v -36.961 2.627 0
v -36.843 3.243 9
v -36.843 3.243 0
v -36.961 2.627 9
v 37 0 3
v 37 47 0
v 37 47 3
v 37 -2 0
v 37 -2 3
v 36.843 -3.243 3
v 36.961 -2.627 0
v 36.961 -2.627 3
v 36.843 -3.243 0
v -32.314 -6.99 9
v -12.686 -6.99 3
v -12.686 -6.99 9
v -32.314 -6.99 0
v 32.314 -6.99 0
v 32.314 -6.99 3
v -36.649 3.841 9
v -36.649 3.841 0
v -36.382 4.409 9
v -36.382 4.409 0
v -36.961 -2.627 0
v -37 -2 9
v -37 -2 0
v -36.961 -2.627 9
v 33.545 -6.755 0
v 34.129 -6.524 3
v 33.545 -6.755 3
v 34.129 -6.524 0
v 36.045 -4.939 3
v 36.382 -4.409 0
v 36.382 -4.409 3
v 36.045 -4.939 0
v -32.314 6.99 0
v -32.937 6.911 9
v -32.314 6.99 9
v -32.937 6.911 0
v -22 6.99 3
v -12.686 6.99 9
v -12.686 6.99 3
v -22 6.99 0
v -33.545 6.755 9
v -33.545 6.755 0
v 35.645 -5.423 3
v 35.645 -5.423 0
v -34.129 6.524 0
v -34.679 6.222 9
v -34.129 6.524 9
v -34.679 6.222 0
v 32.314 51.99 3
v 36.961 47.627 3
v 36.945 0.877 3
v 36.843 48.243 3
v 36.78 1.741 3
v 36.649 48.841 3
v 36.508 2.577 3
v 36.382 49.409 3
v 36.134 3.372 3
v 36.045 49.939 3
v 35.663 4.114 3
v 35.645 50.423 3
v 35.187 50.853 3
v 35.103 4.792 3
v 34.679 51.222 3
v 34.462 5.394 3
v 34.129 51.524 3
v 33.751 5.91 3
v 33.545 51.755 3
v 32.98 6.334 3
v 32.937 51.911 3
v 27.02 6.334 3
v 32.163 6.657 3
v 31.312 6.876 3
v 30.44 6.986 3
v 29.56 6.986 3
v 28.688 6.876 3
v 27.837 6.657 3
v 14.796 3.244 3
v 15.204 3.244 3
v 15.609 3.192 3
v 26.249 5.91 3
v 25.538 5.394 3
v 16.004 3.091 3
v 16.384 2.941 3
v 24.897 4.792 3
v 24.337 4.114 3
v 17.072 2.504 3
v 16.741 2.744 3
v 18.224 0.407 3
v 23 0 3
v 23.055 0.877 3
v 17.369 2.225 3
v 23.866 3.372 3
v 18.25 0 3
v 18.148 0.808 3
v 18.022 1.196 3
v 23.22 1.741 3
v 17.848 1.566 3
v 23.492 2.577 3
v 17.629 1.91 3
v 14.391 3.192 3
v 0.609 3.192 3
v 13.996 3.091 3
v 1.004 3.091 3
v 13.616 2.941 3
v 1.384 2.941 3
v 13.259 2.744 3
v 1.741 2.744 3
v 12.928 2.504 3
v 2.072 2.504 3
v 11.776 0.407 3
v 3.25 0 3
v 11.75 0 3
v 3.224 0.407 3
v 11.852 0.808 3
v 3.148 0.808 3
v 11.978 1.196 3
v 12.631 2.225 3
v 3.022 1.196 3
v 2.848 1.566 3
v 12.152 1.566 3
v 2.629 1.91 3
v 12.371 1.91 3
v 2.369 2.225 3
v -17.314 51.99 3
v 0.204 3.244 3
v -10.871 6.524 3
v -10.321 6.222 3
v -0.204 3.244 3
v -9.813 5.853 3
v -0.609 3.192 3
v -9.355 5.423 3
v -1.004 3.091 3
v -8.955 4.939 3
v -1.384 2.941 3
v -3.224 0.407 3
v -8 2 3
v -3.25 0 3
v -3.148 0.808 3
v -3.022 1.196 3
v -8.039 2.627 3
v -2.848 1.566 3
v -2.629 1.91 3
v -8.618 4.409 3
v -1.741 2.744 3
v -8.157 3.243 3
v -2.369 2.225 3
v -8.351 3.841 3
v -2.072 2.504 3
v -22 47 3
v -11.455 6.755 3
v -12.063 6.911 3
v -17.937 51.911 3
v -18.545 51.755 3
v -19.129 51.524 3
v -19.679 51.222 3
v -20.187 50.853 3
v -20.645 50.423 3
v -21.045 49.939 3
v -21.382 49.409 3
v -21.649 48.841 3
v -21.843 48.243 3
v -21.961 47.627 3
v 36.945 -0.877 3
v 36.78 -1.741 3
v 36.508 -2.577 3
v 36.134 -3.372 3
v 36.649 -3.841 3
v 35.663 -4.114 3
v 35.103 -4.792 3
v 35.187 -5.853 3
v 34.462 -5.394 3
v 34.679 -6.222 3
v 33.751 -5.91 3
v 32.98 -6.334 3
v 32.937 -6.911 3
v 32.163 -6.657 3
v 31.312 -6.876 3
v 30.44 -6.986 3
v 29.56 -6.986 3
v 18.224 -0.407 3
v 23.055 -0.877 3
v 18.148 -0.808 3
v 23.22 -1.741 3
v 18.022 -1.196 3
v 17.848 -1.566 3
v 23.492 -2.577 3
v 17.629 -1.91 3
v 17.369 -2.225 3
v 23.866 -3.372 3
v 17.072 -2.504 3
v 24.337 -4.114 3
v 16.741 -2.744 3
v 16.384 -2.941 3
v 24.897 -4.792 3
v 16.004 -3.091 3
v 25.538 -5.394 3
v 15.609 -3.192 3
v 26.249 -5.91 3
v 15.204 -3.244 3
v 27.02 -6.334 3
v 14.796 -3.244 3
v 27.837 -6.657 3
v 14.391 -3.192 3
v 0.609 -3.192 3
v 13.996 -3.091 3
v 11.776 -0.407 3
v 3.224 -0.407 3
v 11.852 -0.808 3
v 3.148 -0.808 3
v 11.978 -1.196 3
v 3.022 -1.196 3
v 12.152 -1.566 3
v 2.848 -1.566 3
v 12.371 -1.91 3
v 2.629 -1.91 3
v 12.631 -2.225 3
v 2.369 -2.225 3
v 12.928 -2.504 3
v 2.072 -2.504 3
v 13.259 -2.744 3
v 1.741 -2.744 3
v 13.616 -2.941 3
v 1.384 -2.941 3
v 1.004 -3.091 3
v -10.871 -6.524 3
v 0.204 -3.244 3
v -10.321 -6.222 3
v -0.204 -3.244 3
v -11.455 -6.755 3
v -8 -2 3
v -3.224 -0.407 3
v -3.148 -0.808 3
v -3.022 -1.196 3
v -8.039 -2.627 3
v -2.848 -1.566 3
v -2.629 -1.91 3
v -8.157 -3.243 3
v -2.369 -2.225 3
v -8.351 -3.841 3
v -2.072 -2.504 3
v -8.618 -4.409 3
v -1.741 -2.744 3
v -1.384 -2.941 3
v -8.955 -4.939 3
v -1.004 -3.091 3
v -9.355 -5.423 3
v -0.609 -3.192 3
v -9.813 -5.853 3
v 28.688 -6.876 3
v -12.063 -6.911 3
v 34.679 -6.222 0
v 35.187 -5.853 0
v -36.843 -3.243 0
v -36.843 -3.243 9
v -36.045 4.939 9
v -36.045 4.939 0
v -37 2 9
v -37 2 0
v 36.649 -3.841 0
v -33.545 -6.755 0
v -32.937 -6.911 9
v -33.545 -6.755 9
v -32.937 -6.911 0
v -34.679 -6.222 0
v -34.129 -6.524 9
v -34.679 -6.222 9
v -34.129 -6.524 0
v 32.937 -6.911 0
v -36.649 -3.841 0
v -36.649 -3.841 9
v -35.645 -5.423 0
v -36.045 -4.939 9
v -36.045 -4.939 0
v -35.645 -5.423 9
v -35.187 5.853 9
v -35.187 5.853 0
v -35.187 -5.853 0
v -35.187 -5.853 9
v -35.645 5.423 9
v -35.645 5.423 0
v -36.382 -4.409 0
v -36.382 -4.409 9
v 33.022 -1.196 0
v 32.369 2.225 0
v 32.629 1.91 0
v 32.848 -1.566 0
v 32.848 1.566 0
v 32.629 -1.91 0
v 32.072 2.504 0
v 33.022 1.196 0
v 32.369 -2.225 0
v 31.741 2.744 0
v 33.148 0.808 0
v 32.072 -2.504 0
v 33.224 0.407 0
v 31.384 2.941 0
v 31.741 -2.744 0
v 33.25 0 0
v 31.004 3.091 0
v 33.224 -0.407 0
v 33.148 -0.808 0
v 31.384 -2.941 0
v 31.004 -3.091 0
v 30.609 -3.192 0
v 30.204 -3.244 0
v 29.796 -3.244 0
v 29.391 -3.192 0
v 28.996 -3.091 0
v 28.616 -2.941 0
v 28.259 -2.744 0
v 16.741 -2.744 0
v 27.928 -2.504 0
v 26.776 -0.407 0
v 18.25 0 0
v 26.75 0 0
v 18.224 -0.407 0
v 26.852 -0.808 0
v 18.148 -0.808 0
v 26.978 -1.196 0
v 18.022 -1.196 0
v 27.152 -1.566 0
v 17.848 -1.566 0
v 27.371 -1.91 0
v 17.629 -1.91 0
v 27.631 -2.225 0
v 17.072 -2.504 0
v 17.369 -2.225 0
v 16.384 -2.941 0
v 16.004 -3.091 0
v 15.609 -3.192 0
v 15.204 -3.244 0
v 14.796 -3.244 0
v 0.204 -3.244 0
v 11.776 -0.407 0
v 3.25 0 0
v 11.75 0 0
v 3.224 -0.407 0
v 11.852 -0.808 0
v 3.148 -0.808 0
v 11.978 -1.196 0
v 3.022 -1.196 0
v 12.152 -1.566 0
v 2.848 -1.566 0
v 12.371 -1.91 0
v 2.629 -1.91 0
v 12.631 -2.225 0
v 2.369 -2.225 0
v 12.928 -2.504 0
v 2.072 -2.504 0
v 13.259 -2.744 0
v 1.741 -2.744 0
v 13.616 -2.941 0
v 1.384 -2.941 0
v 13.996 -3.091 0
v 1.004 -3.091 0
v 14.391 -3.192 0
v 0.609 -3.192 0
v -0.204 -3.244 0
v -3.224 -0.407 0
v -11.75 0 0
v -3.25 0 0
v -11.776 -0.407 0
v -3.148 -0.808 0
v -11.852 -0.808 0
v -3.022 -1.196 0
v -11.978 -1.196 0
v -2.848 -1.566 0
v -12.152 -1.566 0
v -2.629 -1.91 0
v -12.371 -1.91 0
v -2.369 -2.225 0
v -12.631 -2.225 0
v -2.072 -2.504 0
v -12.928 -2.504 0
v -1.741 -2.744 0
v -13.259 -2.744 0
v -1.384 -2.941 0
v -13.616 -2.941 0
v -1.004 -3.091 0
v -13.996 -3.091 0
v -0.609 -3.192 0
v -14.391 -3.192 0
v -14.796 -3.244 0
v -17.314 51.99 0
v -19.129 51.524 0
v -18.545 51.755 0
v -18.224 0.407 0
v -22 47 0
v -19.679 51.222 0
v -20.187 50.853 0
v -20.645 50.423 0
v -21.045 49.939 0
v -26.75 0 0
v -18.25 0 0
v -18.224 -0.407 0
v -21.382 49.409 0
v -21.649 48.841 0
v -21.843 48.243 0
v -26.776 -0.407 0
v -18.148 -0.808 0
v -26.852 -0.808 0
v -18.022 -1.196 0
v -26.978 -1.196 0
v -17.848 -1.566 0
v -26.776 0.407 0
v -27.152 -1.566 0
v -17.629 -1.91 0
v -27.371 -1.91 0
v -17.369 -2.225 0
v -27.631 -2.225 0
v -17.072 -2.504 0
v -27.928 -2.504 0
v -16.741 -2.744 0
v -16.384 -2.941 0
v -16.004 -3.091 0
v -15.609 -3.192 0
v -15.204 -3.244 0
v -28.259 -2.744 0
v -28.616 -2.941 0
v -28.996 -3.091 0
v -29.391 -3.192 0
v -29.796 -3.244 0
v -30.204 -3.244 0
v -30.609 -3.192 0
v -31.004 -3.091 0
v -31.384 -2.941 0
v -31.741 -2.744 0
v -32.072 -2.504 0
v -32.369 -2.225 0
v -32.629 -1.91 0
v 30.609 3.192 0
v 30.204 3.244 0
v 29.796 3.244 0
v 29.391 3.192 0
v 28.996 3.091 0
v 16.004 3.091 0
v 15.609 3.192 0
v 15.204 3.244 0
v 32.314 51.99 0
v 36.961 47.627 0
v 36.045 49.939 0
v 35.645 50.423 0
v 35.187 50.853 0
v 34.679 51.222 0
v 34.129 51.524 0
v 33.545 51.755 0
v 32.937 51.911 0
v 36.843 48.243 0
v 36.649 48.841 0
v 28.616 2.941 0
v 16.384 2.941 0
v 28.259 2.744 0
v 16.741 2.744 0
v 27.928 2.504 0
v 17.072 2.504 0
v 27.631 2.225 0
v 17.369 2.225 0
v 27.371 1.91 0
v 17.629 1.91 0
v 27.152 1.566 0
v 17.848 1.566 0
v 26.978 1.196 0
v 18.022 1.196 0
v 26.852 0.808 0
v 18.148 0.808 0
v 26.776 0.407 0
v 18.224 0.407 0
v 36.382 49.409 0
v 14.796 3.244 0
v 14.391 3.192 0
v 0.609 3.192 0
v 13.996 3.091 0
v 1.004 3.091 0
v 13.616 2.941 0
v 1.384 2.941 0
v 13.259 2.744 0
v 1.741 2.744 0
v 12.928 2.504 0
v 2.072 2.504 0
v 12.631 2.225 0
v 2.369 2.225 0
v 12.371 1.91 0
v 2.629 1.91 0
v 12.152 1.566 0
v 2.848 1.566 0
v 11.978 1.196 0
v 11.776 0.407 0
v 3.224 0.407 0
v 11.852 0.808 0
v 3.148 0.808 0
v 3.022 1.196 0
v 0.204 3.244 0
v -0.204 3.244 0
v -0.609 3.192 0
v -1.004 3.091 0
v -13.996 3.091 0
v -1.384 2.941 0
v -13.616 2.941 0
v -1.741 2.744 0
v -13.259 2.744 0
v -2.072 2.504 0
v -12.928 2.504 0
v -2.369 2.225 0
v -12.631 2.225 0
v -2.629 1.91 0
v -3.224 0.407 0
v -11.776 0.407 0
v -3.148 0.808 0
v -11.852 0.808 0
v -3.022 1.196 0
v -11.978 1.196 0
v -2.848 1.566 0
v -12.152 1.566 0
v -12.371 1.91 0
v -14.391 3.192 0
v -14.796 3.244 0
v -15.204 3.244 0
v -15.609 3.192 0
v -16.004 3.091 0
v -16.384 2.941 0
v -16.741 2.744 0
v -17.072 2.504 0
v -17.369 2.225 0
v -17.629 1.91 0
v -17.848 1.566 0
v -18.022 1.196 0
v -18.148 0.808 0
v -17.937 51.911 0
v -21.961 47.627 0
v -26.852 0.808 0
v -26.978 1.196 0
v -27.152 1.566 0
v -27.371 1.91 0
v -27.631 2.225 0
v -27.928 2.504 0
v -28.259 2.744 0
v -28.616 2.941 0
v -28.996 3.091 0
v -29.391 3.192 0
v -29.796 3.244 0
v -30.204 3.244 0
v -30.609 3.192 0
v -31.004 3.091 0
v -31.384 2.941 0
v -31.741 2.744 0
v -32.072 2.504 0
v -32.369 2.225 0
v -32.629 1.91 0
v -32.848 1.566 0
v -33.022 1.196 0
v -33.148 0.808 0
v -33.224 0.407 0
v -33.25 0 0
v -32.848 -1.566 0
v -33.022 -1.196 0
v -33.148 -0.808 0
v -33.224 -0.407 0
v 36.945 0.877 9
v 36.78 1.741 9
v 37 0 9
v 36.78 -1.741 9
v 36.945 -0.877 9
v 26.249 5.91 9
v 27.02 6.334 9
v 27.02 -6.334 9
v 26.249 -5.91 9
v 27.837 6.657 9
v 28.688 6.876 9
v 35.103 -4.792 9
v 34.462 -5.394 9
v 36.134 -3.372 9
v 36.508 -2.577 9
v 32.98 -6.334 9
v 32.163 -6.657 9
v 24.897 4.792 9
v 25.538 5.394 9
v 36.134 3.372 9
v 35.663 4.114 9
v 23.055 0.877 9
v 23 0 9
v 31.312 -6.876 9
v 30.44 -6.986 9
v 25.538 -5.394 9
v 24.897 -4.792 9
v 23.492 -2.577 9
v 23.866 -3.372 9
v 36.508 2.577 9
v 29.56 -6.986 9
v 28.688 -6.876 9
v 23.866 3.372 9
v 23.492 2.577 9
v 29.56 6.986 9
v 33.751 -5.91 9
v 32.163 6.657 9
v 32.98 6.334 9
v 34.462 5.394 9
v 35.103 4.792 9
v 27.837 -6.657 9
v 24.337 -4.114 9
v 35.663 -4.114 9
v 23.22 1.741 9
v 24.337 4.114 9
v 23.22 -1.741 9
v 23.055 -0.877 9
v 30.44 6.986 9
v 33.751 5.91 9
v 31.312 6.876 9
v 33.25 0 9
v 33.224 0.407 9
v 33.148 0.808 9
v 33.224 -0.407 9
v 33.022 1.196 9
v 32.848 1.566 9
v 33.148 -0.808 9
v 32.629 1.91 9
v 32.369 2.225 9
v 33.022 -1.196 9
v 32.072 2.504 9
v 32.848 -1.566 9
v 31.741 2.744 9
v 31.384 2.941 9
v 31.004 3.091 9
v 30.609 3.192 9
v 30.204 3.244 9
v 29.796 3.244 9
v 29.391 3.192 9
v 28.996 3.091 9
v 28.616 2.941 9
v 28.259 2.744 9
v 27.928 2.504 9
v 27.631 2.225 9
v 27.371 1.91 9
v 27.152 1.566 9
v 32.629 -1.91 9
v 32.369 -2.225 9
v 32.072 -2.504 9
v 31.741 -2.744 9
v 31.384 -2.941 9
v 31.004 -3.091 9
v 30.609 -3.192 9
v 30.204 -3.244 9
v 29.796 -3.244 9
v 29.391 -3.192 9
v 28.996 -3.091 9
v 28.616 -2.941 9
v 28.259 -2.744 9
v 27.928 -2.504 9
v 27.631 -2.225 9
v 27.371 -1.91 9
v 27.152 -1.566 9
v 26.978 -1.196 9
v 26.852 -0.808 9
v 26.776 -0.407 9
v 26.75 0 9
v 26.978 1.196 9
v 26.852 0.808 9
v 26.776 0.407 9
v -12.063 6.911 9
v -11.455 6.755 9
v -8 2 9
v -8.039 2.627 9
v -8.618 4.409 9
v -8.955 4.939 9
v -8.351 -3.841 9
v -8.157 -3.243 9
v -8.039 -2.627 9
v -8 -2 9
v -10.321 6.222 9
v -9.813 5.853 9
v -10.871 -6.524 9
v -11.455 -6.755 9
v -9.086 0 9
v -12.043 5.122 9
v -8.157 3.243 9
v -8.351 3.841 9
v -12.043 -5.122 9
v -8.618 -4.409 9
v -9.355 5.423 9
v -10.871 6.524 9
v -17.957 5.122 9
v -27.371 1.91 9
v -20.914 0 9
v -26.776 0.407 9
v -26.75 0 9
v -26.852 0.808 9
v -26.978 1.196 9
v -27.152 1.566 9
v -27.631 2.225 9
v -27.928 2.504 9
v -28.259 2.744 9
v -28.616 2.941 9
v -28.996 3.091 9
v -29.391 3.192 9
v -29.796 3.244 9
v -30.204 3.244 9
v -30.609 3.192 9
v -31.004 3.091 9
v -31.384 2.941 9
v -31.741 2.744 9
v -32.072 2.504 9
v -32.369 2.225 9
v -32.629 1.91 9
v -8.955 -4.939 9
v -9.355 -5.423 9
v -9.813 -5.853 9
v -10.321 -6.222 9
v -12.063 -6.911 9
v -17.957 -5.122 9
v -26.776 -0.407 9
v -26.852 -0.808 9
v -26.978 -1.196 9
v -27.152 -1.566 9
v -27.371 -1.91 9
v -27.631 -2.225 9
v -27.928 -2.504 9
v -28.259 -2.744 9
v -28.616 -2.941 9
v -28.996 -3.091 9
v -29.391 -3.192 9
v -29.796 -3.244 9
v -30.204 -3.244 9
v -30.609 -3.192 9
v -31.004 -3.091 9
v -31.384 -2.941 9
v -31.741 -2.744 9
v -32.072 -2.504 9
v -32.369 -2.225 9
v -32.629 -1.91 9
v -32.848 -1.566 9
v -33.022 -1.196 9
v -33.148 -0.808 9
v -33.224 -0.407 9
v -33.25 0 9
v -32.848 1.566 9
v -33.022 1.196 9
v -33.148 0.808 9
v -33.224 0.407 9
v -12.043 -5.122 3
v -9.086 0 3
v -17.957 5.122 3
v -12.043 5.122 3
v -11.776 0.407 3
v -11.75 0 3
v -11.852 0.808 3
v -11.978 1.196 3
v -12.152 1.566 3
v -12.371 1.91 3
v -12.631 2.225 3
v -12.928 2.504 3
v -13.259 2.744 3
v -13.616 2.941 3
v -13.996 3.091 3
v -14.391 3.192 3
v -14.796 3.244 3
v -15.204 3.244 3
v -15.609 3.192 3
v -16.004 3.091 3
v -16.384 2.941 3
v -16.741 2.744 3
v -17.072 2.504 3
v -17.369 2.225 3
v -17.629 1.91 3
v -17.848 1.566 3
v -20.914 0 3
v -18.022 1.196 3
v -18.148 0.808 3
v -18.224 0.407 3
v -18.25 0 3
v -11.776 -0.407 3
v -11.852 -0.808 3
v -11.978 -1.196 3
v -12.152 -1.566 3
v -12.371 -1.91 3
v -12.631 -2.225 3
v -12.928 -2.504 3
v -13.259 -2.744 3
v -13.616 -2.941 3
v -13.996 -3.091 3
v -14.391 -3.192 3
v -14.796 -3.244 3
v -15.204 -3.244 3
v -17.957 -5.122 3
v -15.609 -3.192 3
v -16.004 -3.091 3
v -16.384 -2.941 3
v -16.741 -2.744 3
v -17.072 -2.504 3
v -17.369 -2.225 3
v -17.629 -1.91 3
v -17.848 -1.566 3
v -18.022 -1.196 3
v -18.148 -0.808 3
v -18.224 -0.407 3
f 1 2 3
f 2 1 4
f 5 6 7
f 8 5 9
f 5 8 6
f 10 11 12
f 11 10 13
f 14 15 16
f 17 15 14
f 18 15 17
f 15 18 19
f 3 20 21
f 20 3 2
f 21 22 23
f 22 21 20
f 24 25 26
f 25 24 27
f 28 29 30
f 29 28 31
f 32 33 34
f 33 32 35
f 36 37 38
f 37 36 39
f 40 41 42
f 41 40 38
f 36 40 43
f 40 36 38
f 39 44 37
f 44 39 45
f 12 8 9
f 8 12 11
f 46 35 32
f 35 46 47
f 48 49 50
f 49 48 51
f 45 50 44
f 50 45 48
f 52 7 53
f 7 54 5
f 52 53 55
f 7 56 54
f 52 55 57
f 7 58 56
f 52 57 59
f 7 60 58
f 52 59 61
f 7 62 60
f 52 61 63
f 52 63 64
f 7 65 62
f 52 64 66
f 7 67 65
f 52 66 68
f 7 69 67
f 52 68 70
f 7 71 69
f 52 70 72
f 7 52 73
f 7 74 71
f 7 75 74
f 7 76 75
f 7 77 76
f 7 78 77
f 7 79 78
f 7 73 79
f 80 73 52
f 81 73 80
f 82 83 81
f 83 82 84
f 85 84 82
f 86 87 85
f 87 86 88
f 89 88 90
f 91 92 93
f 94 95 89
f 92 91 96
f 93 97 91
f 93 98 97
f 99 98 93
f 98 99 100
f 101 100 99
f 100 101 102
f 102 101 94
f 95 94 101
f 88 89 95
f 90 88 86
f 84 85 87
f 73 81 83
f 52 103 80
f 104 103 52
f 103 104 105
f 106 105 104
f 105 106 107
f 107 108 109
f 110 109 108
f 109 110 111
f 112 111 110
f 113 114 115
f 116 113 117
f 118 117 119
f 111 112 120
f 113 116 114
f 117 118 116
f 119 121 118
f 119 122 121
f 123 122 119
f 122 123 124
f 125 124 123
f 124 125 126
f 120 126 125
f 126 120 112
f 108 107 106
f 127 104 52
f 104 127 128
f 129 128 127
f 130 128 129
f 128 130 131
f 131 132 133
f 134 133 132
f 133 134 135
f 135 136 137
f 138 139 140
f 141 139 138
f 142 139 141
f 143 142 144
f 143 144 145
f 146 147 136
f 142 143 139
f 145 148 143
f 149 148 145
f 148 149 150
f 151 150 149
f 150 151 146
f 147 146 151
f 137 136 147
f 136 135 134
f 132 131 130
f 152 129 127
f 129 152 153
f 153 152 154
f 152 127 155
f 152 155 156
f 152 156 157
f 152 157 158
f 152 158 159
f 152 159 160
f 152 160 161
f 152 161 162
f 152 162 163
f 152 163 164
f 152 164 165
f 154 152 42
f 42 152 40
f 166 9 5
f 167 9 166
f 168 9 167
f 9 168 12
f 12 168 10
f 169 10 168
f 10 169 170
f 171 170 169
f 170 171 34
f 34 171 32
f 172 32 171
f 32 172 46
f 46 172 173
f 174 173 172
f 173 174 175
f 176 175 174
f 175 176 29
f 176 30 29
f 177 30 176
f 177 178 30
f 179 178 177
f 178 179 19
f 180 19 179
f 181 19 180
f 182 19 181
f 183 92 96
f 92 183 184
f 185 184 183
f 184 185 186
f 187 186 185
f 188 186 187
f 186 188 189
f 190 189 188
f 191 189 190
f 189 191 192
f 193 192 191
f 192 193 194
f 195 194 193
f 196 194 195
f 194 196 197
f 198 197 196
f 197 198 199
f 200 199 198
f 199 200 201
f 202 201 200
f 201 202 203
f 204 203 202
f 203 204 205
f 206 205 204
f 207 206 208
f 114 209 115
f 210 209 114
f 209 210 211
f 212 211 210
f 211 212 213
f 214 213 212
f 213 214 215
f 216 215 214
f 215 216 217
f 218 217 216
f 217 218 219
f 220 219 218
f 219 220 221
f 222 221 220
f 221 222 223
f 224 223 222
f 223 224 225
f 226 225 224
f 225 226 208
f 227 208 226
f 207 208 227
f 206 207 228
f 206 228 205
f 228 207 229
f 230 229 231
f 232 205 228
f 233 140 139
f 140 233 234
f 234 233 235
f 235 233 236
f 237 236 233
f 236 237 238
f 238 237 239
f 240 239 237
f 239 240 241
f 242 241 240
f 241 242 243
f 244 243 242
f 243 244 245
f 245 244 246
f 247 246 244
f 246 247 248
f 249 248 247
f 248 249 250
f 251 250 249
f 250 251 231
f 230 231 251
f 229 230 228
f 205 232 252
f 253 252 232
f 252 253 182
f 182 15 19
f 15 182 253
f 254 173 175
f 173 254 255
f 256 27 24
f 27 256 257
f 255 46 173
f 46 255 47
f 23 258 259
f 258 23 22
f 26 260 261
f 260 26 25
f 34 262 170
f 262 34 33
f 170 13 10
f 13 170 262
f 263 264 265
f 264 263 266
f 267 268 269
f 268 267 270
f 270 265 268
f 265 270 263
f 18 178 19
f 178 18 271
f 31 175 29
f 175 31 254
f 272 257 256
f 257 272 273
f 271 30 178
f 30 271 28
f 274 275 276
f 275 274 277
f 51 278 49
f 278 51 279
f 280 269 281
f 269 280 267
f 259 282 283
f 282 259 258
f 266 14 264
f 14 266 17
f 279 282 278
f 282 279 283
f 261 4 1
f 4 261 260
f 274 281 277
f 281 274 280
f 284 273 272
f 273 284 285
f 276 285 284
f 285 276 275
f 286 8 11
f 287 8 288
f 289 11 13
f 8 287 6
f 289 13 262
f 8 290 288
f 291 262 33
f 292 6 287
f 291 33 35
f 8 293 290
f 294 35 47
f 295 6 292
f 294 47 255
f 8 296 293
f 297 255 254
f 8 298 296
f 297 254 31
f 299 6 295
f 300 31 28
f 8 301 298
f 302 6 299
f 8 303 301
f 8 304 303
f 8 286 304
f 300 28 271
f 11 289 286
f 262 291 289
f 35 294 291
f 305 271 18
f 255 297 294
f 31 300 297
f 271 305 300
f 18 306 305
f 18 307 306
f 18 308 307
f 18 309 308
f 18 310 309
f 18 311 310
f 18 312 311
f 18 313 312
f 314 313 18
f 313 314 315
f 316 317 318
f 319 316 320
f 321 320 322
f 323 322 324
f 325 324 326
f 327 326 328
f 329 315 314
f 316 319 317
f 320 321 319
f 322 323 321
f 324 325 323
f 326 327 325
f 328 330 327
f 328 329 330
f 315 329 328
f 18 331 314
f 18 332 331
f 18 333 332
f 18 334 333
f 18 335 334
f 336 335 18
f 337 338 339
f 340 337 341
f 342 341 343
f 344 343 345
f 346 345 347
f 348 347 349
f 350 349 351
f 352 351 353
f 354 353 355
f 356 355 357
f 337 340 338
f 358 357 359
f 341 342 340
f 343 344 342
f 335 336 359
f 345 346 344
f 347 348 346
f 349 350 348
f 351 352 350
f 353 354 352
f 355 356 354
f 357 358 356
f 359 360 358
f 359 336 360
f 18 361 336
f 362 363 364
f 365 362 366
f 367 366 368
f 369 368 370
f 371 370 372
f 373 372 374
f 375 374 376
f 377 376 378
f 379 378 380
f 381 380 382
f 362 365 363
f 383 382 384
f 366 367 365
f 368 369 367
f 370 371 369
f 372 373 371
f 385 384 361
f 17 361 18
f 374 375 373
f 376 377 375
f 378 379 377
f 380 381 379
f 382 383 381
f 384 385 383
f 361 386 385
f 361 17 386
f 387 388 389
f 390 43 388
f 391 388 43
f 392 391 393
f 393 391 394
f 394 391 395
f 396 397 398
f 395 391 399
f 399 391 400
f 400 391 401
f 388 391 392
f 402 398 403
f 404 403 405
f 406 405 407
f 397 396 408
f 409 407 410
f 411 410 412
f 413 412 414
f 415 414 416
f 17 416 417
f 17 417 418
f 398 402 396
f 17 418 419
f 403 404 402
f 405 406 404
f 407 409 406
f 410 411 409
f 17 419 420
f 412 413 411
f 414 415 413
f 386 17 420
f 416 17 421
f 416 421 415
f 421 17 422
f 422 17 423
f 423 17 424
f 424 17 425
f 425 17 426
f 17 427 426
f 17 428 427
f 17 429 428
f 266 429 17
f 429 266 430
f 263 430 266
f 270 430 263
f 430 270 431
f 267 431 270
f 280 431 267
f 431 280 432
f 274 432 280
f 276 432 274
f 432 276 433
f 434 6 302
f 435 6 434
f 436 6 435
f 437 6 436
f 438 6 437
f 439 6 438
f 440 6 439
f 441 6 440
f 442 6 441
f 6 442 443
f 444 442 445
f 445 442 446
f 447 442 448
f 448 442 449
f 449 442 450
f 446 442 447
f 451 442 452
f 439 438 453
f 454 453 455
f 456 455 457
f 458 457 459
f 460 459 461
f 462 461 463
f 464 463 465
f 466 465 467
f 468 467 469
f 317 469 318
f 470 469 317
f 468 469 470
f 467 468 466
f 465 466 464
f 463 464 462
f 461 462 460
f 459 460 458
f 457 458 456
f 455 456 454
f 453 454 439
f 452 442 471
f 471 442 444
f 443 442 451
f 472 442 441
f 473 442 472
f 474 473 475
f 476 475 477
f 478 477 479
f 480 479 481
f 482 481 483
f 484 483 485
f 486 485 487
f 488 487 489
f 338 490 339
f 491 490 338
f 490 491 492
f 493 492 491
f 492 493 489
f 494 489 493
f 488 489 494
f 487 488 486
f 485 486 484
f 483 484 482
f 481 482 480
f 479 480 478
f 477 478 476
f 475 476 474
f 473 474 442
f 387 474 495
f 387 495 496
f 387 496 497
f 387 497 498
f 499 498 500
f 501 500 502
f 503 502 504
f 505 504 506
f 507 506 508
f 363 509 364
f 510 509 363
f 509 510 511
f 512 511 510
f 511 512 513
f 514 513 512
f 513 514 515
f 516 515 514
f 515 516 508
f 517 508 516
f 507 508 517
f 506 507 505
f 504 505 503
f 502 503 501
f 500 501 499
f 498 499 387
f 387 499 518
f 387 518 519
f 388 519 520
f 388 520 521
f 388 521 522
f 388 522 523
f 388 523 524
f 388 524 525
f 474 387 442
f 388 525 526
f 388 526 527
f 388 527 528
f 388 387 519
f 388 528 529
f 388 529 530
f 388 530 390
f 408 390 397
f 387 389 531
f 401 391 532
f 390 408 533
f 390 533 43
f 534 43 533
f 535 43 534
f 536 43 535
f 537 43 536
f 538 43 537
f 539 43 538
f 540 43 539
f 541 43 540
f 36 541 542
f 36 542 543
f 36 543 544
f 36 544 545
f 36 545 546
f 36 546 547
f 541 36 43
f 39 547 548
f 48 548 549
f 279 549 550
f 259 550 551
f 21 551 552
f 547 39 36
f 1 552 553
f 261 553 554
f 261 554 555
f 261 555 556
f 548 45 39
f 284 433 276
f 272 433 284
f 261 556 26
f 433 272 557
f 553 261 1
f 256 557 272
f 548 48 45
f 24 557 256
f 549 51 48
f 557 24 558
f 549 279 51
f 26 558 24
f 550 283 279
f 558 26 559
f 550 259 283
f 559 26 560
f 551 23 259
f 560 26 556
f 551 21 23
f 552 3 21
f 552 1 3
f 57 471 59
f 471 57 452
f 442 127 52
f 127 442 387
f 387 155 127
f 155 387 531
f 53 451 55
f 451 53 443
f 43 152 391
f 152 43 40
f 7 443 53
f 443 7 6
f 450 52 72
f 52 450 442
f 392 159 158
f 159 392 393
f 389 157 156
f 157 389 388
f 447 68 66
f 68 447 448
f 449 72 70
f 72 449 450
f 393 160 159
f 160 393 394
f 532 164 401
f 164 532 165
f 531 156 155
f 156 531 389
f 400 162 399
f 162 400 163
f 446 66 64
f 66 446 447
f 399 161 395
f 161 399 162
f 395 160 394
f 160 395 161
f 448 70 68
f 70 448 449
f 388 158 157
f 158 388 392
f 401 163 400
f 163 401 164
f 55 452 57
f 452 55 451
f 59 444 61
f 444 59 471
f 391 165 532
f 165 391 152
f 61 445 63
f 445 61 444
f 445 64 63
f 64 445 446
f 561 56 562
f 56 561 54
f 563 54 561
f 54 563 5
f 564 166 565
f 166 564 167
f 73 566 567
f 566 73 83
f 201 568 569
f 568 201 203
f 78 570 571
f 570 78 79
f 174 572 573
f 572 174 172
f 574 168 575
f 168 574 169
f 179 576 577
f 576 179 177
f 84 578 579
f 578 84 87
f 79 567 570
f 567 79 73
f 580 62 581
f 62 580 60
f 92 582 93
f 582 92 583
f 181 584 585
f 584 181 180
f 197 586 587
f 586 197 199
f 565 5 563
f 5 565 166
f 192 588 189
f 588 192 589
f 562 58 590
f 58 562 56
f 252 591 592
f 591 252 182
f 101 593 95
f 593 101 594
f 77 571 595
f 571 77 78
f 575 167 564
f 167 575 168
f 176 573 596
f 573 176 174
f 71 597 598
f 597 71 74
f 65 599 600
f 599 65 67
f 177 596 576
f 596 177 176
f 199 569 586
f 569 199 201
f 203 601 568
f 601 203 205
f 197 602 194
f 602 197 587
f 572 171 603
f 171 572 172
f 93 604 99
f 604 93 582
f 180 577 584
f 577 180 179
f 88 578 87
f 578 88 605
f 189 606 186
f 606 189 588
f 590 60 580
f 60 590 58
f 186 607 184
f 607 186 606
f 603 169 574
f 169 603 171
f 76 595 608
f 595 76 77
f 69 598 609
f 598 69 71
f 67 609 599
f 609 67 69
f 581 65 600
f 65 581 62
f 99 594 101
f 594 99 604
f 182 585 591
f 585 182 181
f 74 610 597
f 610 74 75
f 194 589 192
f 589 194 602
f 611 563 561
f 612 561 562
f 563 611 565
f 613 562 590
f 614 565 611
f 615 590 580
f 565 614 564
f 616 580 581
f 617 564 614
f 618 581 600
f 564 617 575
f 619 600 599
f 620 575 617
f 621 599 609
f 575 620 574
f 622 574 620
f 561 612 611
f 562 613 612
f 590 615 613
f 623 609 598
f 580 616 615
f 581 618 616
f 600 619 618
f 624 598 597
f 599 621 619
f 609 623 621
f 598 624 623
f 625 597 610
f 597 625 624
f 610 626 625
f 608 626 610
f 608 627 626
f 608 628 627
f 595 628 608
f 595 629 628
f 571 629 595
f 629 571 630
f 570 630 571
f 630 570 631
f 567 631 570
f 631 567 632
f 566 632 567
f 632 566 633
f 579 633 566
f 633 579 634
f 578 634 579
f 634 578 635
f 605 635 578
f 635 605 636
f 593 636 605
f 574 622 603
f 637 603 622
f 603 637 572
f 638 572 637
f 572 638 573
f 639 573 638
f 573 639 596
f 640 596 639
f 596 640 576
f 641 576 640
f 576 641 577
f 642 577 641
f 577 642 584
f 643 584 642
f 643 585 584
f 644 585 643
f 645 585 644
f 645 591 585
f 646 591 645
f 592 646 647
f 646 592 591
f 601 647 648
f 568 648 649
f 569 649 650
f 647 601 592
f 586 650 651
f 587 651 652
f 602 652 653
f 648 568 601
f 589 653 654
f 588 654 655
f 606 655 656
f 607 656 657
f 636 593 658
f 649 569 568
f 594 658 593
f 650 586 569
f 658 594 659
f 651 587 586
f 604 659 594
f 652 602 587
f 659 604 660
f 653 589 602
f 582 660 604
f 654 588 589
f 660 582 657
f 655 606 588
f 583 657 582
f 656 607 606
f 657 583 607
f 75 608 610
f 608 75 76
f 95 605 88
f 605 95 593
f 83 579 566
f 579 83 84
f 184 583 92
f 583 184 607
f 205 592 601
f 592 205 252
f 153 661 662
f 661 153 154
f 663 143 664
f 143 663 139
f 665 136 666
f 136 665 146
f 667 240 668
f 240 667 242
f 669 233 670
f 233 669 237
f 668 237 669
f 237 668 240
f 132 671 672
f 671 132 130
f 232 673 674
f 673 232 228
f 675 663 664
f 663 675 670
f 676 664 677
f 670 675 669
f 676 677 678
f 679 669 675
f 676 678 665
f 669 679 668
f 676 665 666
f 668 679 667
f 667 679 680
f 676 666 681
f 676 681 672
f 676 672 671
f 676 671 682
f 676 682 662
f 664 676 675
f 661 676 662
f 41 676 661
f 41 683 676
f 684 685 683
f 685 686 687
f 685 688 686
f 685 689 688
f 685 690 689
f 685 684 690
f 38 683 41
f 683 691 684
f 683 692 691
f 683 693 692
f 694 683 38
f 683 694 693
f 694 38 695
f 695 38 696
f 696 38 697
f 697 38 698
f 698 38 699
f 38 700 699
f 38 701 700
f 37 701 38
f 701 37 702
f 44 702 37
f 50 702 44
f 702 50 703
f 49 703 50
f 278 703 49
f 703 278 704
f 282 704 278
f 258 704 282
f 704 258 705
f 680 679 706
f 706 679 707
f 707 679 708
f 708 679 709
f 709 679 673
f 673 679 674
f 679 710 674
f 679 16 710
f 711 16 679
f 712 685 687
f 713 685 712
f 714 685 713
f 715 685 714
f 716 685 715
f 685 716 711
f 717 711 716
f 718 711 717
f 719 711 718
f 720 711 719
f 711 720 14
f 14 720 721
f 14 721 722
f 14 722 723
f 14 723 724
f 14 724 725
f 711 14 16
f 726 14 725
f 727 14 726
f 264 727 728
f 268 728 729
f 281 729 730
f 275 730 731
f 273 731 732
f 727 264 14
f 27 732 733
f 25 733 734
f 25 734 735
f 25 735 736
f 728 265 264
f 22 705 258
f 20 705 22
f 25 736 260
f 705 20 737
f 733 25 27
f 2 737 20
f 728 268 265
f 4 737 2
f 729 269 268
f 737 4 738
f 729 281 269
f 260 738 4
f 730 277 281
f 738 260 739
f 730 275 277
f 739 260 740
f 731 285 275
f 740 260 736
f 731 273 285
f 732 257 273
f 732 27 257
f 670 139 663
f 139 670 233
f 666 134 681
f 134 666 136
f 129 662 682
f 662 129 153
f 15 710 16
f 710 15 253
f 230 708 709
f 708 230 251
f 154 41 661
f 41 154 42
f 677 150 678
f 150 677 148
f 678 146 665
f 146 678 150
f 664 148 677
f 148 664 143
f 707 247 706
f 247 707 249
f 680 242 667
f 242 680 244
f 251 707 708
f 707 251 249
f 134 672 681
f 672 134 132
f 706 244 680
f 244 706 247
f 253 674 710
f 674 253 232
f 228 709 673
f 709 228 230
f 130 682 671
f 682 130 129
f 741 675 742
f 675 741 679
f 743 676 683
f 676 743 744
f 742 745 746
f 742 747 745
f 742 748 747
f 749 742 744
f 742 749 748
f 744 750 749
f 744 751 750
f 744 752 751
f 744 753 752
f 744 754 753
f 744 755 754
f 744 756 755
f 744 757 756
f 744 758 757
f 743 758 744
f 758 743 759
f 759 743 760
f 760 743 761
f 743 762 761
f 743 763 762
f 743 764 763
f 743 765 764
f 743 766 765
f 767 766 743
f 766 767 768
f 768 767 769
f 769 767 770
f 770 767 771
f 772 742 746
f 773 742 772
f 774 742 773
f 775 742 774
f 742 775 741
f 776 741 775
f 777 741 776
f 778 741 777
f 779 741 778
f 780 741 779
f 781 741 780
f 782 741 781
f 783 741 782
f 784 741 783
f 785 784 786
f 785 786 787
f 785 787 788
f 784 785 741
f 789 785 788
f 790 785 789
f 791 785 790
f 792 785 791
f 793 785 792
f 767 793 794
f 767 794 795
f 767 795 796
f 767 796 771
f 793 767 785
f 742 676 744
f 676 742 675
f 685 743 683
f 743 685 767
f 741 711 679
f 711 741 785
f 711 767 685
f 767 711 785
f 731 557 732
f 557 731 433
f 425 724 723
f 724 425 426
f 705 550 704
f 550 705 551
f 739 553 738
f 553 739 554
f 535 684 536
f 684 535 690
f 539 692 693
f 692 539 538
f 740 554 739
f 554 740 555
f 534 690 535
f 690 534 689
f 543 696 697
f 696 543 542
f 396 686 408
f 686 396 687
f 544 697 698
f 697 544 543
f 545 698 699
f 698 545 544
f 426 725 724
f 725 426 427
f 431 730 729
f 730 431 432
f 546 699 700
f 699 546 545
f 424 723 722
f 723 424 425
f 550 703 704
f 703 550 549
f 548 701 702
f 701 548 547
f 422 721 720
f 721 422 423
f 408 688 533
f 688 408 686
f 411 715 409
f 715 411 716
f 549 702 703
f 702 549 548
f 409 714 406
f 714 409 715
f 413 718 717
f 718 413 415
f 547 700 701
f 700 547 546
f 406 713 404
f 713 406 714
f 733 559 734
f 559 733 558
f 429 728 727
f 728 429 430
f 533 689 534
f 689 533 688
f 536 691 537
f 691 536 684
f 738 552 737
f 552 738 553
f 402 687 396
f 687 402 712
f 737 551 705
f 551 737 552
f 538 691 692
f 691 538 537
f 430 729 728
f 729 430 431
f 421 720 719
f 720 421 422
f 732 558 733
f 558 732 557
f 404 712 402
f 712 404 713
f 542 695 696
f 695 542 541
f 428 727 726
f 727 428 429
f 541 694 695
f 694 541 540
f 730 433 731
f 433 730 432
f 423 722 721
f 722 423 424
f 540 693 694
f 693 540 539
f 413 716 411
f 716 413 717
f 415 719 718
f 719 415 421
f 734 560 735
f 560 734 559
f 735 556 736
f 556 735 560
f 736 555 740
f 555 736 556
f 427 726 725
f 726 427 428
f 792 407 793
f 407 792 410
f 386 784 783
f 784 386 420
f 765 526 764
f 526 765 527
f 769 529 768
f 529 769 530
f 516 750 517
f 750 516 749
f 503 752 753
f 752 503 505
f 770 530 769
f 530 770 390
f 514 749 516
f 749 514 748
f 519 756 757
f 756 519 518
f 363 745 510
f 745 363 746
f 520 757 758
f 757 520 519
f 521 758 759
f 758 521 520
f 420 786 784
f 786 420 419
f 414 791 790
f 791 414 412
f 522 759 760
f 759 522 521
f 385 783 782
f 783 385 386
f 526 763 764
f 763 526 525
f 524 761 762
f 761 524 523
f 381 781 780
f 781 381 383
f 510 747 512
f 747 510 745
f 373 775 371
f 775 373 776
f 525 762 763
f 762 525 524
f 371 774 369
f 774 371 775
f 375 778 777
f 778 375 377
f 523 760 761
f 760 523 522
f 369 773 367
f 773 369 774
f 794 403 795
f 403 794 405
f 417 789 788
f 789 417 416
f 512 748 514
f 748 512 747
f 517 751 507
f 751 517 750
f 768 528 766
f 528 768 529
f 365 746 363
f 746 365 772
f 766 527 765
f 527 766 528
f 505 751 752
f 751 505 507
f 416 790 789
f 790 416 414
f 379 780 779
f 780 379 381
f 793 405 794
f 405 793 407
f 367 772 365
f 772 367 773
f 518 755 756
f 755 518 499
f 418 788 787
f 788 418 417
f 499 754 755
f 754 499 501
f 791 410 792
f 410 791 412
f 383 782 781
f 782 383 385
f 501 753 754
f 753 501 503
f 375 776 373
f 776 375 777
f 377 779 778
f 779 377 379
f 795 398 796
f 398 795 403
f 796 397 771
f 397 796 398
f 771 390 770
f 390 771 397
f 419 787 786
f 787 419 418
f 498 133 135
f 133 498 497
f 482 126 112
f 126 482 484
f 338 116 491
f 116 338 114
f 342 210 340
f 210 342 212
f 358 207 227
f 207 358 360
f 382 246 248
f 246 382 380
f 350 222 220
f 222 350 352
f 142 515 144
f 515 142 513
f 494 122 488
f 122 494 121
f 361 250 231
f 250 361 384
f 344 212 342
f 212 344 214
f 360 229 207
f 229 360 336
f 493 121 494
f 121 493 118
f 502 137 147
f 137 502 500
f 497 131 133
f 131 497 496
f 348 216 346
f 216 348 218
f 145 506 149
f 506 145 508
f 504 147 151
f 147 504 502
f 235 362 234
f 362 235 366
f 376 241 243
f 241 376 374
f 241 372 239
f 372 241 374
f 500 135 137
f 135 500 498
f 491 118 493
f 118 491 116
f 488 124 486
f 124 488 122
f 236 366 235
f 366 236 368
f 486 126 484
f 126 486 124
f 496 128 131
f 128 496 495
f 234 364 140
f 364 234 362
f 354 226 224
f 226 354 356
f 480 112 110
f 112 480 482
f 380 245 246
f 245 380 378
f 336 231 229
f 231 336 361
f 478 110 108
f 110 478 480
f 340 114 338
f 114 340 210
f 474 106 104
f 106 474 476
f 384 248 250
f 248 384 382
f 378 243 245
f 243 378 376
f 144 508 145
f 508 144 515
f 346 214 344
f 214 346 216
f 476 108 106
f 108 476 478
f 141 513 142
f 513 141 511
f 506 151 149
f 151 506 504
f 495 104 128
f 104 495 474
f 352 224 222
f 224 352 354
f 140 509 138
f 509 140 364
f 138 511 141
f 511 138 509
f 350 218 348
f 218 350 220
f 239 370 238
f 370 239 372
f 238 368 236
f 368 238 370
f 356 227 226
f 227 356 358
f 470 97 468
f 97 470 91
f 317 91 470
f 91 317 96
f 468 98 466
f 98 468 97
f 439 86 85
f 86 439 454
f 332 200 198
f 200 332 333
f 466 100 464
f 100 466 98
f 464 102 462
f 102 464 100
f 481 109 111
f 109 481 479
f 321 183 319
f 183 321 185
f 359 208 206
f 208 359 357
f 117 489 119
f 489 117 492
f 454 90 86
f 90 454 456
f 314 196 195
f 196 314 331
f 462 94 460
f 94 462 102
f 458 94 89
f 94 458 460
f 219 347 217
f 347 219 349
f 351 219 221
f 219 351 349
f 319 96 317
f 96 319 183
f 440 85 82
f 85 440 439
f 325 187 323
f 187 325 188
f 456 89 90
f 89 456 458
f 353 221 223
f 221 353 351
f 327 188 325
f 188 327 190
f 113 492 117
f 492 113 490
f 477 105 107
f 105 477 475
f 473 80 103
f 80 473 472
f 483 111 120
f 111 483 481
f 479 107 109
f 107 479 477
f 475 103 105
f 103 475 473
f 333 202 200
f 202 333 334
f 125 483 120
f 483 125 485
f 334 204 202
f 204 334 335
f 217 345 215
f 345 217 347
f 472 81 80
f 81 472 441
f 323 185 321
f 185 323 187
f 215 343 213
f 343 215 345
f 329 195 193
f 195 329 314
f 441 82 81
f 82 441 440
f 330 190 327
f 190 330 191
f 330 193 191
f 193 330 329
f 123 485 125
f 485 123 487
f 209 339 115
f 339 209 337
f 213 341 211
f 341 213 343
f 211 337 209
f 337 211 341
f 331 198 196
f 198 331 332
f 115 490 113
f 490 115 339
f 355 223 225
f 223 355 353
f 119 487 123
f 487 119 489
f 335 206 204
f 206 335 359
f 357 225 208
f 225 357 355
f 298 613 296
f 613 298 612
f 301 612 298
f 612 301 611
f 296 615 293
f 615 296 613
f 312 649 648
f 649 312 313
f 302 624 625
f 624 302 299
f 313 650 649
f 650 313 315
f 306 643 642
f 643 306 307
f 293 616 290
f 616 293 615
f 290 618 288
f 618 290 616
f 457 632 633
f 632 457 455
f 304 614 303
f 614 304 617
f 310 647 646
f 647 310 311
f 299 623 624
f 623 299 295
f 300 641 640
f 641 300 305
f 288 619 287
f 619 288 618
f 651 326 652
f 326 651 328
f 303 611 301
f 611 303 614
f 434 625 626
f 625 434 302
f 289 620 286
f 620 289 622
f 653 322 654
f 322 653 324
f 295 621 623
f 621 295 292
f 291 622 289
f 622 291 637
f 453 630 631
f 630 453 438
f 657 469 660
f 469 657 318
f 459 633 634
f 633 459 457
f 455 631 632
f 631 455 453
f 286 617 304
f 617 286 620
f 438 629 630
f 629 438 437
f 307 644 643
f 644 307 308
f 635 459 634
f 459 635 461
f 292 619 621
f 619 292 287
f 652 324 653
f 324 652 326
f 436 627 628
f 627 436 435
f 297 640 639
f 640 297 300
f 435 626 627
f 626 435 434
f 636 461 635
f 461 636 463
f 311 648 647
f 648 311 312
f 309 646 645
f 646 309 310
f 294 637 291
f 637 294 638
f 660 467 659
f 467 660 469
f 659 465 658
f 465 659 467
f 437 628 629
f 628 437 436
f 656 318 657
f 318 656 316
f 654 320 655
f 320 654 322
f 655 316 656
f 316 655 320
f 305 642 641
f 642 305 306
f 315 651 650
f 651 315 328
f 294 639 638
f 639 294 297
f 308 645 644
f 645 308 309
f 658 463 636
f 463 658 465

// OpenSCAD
$fn = 50;


difference() {
	union() {
		hull() {
			translate(v = [-32.0000000000, 2.0000000000, 0]) {
				cylinder(h = 3, r = 5);
			}
			translate(v = [32.0000000000, 2.0000000000, 0]) {
				cylinder(h = 3, r = 5);
			}
			translate(v = [-32.0000000000, -2.0000000000, 0]) {
				cylinder(h = 3, r = 5);
			}
			translate(v = [32.0000000000, -2.0000000000, 0]) {
				cylinder(h = 3, r = 5);
			}
		}
		translate(v = [7.5000000000, 22.5000000000, 0]) {
			hull() {
				translate(v = [-24.5000000000, 24.5000000000, 0]) {
					cylinder(h = 3, r = 5);
				}
				translate(v = [24.5000000000, 24.5000000000, 0]) {
					cylinder(h = 3, r = 5);
				}
				translate(v = [-24.5000000000, -24.5000000000, 0]) {
					cylinder(h = 3, r = 5);
				}
				translate(v = [24.5000000000, -24.5000000000, 0]) {
					cylinder(h = 3, r = 5);
				}
			}
		}
		translate(v = [30.0000000000, 0, 0]) {
			cylinder(h = 9, r = 7.0000000000);
		}
		translate(v = [-22.5000000000, 0, 0]) {
			hull() {
				translate(v = [-9.5000000000, 2.0000000000, 0]) {
					cylinder(h = 9, r = 5);
				}
				translate(v = [9.5000000000, 2.0000000000, 0]) {
					cylinder(h = 9, r = 5);
				}
				translate(v = [-9.5000000000, -2.0000000000, 0]) {
					cylinder(h = 9, r = 5);
				}
				translate(v = [9.5000000000, -2.0000000000, 0]) {
					cylinder(h = 9, r = 5);
				}
			}
		}
	}
	union() {
		translate(v = [-15.0000000000, 0, 9]) {
			rotate(a = [0, 0, 0]) {
				difference() {
					union() {
						translate(v = [0, 0, -6]) {
							linear_extrude(height = 6) {
								polygon(points = [[5.9142500000, 0.0000000000], [2.9571250000, 5.1218907443], [-2.9571250000, 5.1218907443], [-5.9142500000, 0.0000000000], [-2.9571250000, -5.1218907443], [2.9571250000, -5.1218907443]]);
							}
						}
					}
					union();
				}
			}
		}
		translate(v = [-30.0000000000, 0.0000000000, 0]) {
			translate(v = [0, 0, -50]) {
				cylinder(h = 100, r = 3.2500000000);
			}
		}
		translate(v = [-15.0000000000, 0.0000000000, 0]) {
			translate(v = [0, 0, -50]) {
				cylinder(h = 100, r = 3.2500000000);
			}
		}
		translate(v = [0, 0, -50]) {
			cylinder(h = 100, r = 3.2500000000);
		}
		translate(v = [15.0000000000, 0.0000000000, 0]) {
			translate(v = [0, 0, -50]) {
				cylinder(h = 100, r = 3.2500000000);
			}
		}
		translate(v = [30.0000000000, 0.0000000000, 0]) {
			translate(v = [0, 0, -50]) {
				cylinder(h = 100, r = 3.2500000000);
			}
		}
	}
}
